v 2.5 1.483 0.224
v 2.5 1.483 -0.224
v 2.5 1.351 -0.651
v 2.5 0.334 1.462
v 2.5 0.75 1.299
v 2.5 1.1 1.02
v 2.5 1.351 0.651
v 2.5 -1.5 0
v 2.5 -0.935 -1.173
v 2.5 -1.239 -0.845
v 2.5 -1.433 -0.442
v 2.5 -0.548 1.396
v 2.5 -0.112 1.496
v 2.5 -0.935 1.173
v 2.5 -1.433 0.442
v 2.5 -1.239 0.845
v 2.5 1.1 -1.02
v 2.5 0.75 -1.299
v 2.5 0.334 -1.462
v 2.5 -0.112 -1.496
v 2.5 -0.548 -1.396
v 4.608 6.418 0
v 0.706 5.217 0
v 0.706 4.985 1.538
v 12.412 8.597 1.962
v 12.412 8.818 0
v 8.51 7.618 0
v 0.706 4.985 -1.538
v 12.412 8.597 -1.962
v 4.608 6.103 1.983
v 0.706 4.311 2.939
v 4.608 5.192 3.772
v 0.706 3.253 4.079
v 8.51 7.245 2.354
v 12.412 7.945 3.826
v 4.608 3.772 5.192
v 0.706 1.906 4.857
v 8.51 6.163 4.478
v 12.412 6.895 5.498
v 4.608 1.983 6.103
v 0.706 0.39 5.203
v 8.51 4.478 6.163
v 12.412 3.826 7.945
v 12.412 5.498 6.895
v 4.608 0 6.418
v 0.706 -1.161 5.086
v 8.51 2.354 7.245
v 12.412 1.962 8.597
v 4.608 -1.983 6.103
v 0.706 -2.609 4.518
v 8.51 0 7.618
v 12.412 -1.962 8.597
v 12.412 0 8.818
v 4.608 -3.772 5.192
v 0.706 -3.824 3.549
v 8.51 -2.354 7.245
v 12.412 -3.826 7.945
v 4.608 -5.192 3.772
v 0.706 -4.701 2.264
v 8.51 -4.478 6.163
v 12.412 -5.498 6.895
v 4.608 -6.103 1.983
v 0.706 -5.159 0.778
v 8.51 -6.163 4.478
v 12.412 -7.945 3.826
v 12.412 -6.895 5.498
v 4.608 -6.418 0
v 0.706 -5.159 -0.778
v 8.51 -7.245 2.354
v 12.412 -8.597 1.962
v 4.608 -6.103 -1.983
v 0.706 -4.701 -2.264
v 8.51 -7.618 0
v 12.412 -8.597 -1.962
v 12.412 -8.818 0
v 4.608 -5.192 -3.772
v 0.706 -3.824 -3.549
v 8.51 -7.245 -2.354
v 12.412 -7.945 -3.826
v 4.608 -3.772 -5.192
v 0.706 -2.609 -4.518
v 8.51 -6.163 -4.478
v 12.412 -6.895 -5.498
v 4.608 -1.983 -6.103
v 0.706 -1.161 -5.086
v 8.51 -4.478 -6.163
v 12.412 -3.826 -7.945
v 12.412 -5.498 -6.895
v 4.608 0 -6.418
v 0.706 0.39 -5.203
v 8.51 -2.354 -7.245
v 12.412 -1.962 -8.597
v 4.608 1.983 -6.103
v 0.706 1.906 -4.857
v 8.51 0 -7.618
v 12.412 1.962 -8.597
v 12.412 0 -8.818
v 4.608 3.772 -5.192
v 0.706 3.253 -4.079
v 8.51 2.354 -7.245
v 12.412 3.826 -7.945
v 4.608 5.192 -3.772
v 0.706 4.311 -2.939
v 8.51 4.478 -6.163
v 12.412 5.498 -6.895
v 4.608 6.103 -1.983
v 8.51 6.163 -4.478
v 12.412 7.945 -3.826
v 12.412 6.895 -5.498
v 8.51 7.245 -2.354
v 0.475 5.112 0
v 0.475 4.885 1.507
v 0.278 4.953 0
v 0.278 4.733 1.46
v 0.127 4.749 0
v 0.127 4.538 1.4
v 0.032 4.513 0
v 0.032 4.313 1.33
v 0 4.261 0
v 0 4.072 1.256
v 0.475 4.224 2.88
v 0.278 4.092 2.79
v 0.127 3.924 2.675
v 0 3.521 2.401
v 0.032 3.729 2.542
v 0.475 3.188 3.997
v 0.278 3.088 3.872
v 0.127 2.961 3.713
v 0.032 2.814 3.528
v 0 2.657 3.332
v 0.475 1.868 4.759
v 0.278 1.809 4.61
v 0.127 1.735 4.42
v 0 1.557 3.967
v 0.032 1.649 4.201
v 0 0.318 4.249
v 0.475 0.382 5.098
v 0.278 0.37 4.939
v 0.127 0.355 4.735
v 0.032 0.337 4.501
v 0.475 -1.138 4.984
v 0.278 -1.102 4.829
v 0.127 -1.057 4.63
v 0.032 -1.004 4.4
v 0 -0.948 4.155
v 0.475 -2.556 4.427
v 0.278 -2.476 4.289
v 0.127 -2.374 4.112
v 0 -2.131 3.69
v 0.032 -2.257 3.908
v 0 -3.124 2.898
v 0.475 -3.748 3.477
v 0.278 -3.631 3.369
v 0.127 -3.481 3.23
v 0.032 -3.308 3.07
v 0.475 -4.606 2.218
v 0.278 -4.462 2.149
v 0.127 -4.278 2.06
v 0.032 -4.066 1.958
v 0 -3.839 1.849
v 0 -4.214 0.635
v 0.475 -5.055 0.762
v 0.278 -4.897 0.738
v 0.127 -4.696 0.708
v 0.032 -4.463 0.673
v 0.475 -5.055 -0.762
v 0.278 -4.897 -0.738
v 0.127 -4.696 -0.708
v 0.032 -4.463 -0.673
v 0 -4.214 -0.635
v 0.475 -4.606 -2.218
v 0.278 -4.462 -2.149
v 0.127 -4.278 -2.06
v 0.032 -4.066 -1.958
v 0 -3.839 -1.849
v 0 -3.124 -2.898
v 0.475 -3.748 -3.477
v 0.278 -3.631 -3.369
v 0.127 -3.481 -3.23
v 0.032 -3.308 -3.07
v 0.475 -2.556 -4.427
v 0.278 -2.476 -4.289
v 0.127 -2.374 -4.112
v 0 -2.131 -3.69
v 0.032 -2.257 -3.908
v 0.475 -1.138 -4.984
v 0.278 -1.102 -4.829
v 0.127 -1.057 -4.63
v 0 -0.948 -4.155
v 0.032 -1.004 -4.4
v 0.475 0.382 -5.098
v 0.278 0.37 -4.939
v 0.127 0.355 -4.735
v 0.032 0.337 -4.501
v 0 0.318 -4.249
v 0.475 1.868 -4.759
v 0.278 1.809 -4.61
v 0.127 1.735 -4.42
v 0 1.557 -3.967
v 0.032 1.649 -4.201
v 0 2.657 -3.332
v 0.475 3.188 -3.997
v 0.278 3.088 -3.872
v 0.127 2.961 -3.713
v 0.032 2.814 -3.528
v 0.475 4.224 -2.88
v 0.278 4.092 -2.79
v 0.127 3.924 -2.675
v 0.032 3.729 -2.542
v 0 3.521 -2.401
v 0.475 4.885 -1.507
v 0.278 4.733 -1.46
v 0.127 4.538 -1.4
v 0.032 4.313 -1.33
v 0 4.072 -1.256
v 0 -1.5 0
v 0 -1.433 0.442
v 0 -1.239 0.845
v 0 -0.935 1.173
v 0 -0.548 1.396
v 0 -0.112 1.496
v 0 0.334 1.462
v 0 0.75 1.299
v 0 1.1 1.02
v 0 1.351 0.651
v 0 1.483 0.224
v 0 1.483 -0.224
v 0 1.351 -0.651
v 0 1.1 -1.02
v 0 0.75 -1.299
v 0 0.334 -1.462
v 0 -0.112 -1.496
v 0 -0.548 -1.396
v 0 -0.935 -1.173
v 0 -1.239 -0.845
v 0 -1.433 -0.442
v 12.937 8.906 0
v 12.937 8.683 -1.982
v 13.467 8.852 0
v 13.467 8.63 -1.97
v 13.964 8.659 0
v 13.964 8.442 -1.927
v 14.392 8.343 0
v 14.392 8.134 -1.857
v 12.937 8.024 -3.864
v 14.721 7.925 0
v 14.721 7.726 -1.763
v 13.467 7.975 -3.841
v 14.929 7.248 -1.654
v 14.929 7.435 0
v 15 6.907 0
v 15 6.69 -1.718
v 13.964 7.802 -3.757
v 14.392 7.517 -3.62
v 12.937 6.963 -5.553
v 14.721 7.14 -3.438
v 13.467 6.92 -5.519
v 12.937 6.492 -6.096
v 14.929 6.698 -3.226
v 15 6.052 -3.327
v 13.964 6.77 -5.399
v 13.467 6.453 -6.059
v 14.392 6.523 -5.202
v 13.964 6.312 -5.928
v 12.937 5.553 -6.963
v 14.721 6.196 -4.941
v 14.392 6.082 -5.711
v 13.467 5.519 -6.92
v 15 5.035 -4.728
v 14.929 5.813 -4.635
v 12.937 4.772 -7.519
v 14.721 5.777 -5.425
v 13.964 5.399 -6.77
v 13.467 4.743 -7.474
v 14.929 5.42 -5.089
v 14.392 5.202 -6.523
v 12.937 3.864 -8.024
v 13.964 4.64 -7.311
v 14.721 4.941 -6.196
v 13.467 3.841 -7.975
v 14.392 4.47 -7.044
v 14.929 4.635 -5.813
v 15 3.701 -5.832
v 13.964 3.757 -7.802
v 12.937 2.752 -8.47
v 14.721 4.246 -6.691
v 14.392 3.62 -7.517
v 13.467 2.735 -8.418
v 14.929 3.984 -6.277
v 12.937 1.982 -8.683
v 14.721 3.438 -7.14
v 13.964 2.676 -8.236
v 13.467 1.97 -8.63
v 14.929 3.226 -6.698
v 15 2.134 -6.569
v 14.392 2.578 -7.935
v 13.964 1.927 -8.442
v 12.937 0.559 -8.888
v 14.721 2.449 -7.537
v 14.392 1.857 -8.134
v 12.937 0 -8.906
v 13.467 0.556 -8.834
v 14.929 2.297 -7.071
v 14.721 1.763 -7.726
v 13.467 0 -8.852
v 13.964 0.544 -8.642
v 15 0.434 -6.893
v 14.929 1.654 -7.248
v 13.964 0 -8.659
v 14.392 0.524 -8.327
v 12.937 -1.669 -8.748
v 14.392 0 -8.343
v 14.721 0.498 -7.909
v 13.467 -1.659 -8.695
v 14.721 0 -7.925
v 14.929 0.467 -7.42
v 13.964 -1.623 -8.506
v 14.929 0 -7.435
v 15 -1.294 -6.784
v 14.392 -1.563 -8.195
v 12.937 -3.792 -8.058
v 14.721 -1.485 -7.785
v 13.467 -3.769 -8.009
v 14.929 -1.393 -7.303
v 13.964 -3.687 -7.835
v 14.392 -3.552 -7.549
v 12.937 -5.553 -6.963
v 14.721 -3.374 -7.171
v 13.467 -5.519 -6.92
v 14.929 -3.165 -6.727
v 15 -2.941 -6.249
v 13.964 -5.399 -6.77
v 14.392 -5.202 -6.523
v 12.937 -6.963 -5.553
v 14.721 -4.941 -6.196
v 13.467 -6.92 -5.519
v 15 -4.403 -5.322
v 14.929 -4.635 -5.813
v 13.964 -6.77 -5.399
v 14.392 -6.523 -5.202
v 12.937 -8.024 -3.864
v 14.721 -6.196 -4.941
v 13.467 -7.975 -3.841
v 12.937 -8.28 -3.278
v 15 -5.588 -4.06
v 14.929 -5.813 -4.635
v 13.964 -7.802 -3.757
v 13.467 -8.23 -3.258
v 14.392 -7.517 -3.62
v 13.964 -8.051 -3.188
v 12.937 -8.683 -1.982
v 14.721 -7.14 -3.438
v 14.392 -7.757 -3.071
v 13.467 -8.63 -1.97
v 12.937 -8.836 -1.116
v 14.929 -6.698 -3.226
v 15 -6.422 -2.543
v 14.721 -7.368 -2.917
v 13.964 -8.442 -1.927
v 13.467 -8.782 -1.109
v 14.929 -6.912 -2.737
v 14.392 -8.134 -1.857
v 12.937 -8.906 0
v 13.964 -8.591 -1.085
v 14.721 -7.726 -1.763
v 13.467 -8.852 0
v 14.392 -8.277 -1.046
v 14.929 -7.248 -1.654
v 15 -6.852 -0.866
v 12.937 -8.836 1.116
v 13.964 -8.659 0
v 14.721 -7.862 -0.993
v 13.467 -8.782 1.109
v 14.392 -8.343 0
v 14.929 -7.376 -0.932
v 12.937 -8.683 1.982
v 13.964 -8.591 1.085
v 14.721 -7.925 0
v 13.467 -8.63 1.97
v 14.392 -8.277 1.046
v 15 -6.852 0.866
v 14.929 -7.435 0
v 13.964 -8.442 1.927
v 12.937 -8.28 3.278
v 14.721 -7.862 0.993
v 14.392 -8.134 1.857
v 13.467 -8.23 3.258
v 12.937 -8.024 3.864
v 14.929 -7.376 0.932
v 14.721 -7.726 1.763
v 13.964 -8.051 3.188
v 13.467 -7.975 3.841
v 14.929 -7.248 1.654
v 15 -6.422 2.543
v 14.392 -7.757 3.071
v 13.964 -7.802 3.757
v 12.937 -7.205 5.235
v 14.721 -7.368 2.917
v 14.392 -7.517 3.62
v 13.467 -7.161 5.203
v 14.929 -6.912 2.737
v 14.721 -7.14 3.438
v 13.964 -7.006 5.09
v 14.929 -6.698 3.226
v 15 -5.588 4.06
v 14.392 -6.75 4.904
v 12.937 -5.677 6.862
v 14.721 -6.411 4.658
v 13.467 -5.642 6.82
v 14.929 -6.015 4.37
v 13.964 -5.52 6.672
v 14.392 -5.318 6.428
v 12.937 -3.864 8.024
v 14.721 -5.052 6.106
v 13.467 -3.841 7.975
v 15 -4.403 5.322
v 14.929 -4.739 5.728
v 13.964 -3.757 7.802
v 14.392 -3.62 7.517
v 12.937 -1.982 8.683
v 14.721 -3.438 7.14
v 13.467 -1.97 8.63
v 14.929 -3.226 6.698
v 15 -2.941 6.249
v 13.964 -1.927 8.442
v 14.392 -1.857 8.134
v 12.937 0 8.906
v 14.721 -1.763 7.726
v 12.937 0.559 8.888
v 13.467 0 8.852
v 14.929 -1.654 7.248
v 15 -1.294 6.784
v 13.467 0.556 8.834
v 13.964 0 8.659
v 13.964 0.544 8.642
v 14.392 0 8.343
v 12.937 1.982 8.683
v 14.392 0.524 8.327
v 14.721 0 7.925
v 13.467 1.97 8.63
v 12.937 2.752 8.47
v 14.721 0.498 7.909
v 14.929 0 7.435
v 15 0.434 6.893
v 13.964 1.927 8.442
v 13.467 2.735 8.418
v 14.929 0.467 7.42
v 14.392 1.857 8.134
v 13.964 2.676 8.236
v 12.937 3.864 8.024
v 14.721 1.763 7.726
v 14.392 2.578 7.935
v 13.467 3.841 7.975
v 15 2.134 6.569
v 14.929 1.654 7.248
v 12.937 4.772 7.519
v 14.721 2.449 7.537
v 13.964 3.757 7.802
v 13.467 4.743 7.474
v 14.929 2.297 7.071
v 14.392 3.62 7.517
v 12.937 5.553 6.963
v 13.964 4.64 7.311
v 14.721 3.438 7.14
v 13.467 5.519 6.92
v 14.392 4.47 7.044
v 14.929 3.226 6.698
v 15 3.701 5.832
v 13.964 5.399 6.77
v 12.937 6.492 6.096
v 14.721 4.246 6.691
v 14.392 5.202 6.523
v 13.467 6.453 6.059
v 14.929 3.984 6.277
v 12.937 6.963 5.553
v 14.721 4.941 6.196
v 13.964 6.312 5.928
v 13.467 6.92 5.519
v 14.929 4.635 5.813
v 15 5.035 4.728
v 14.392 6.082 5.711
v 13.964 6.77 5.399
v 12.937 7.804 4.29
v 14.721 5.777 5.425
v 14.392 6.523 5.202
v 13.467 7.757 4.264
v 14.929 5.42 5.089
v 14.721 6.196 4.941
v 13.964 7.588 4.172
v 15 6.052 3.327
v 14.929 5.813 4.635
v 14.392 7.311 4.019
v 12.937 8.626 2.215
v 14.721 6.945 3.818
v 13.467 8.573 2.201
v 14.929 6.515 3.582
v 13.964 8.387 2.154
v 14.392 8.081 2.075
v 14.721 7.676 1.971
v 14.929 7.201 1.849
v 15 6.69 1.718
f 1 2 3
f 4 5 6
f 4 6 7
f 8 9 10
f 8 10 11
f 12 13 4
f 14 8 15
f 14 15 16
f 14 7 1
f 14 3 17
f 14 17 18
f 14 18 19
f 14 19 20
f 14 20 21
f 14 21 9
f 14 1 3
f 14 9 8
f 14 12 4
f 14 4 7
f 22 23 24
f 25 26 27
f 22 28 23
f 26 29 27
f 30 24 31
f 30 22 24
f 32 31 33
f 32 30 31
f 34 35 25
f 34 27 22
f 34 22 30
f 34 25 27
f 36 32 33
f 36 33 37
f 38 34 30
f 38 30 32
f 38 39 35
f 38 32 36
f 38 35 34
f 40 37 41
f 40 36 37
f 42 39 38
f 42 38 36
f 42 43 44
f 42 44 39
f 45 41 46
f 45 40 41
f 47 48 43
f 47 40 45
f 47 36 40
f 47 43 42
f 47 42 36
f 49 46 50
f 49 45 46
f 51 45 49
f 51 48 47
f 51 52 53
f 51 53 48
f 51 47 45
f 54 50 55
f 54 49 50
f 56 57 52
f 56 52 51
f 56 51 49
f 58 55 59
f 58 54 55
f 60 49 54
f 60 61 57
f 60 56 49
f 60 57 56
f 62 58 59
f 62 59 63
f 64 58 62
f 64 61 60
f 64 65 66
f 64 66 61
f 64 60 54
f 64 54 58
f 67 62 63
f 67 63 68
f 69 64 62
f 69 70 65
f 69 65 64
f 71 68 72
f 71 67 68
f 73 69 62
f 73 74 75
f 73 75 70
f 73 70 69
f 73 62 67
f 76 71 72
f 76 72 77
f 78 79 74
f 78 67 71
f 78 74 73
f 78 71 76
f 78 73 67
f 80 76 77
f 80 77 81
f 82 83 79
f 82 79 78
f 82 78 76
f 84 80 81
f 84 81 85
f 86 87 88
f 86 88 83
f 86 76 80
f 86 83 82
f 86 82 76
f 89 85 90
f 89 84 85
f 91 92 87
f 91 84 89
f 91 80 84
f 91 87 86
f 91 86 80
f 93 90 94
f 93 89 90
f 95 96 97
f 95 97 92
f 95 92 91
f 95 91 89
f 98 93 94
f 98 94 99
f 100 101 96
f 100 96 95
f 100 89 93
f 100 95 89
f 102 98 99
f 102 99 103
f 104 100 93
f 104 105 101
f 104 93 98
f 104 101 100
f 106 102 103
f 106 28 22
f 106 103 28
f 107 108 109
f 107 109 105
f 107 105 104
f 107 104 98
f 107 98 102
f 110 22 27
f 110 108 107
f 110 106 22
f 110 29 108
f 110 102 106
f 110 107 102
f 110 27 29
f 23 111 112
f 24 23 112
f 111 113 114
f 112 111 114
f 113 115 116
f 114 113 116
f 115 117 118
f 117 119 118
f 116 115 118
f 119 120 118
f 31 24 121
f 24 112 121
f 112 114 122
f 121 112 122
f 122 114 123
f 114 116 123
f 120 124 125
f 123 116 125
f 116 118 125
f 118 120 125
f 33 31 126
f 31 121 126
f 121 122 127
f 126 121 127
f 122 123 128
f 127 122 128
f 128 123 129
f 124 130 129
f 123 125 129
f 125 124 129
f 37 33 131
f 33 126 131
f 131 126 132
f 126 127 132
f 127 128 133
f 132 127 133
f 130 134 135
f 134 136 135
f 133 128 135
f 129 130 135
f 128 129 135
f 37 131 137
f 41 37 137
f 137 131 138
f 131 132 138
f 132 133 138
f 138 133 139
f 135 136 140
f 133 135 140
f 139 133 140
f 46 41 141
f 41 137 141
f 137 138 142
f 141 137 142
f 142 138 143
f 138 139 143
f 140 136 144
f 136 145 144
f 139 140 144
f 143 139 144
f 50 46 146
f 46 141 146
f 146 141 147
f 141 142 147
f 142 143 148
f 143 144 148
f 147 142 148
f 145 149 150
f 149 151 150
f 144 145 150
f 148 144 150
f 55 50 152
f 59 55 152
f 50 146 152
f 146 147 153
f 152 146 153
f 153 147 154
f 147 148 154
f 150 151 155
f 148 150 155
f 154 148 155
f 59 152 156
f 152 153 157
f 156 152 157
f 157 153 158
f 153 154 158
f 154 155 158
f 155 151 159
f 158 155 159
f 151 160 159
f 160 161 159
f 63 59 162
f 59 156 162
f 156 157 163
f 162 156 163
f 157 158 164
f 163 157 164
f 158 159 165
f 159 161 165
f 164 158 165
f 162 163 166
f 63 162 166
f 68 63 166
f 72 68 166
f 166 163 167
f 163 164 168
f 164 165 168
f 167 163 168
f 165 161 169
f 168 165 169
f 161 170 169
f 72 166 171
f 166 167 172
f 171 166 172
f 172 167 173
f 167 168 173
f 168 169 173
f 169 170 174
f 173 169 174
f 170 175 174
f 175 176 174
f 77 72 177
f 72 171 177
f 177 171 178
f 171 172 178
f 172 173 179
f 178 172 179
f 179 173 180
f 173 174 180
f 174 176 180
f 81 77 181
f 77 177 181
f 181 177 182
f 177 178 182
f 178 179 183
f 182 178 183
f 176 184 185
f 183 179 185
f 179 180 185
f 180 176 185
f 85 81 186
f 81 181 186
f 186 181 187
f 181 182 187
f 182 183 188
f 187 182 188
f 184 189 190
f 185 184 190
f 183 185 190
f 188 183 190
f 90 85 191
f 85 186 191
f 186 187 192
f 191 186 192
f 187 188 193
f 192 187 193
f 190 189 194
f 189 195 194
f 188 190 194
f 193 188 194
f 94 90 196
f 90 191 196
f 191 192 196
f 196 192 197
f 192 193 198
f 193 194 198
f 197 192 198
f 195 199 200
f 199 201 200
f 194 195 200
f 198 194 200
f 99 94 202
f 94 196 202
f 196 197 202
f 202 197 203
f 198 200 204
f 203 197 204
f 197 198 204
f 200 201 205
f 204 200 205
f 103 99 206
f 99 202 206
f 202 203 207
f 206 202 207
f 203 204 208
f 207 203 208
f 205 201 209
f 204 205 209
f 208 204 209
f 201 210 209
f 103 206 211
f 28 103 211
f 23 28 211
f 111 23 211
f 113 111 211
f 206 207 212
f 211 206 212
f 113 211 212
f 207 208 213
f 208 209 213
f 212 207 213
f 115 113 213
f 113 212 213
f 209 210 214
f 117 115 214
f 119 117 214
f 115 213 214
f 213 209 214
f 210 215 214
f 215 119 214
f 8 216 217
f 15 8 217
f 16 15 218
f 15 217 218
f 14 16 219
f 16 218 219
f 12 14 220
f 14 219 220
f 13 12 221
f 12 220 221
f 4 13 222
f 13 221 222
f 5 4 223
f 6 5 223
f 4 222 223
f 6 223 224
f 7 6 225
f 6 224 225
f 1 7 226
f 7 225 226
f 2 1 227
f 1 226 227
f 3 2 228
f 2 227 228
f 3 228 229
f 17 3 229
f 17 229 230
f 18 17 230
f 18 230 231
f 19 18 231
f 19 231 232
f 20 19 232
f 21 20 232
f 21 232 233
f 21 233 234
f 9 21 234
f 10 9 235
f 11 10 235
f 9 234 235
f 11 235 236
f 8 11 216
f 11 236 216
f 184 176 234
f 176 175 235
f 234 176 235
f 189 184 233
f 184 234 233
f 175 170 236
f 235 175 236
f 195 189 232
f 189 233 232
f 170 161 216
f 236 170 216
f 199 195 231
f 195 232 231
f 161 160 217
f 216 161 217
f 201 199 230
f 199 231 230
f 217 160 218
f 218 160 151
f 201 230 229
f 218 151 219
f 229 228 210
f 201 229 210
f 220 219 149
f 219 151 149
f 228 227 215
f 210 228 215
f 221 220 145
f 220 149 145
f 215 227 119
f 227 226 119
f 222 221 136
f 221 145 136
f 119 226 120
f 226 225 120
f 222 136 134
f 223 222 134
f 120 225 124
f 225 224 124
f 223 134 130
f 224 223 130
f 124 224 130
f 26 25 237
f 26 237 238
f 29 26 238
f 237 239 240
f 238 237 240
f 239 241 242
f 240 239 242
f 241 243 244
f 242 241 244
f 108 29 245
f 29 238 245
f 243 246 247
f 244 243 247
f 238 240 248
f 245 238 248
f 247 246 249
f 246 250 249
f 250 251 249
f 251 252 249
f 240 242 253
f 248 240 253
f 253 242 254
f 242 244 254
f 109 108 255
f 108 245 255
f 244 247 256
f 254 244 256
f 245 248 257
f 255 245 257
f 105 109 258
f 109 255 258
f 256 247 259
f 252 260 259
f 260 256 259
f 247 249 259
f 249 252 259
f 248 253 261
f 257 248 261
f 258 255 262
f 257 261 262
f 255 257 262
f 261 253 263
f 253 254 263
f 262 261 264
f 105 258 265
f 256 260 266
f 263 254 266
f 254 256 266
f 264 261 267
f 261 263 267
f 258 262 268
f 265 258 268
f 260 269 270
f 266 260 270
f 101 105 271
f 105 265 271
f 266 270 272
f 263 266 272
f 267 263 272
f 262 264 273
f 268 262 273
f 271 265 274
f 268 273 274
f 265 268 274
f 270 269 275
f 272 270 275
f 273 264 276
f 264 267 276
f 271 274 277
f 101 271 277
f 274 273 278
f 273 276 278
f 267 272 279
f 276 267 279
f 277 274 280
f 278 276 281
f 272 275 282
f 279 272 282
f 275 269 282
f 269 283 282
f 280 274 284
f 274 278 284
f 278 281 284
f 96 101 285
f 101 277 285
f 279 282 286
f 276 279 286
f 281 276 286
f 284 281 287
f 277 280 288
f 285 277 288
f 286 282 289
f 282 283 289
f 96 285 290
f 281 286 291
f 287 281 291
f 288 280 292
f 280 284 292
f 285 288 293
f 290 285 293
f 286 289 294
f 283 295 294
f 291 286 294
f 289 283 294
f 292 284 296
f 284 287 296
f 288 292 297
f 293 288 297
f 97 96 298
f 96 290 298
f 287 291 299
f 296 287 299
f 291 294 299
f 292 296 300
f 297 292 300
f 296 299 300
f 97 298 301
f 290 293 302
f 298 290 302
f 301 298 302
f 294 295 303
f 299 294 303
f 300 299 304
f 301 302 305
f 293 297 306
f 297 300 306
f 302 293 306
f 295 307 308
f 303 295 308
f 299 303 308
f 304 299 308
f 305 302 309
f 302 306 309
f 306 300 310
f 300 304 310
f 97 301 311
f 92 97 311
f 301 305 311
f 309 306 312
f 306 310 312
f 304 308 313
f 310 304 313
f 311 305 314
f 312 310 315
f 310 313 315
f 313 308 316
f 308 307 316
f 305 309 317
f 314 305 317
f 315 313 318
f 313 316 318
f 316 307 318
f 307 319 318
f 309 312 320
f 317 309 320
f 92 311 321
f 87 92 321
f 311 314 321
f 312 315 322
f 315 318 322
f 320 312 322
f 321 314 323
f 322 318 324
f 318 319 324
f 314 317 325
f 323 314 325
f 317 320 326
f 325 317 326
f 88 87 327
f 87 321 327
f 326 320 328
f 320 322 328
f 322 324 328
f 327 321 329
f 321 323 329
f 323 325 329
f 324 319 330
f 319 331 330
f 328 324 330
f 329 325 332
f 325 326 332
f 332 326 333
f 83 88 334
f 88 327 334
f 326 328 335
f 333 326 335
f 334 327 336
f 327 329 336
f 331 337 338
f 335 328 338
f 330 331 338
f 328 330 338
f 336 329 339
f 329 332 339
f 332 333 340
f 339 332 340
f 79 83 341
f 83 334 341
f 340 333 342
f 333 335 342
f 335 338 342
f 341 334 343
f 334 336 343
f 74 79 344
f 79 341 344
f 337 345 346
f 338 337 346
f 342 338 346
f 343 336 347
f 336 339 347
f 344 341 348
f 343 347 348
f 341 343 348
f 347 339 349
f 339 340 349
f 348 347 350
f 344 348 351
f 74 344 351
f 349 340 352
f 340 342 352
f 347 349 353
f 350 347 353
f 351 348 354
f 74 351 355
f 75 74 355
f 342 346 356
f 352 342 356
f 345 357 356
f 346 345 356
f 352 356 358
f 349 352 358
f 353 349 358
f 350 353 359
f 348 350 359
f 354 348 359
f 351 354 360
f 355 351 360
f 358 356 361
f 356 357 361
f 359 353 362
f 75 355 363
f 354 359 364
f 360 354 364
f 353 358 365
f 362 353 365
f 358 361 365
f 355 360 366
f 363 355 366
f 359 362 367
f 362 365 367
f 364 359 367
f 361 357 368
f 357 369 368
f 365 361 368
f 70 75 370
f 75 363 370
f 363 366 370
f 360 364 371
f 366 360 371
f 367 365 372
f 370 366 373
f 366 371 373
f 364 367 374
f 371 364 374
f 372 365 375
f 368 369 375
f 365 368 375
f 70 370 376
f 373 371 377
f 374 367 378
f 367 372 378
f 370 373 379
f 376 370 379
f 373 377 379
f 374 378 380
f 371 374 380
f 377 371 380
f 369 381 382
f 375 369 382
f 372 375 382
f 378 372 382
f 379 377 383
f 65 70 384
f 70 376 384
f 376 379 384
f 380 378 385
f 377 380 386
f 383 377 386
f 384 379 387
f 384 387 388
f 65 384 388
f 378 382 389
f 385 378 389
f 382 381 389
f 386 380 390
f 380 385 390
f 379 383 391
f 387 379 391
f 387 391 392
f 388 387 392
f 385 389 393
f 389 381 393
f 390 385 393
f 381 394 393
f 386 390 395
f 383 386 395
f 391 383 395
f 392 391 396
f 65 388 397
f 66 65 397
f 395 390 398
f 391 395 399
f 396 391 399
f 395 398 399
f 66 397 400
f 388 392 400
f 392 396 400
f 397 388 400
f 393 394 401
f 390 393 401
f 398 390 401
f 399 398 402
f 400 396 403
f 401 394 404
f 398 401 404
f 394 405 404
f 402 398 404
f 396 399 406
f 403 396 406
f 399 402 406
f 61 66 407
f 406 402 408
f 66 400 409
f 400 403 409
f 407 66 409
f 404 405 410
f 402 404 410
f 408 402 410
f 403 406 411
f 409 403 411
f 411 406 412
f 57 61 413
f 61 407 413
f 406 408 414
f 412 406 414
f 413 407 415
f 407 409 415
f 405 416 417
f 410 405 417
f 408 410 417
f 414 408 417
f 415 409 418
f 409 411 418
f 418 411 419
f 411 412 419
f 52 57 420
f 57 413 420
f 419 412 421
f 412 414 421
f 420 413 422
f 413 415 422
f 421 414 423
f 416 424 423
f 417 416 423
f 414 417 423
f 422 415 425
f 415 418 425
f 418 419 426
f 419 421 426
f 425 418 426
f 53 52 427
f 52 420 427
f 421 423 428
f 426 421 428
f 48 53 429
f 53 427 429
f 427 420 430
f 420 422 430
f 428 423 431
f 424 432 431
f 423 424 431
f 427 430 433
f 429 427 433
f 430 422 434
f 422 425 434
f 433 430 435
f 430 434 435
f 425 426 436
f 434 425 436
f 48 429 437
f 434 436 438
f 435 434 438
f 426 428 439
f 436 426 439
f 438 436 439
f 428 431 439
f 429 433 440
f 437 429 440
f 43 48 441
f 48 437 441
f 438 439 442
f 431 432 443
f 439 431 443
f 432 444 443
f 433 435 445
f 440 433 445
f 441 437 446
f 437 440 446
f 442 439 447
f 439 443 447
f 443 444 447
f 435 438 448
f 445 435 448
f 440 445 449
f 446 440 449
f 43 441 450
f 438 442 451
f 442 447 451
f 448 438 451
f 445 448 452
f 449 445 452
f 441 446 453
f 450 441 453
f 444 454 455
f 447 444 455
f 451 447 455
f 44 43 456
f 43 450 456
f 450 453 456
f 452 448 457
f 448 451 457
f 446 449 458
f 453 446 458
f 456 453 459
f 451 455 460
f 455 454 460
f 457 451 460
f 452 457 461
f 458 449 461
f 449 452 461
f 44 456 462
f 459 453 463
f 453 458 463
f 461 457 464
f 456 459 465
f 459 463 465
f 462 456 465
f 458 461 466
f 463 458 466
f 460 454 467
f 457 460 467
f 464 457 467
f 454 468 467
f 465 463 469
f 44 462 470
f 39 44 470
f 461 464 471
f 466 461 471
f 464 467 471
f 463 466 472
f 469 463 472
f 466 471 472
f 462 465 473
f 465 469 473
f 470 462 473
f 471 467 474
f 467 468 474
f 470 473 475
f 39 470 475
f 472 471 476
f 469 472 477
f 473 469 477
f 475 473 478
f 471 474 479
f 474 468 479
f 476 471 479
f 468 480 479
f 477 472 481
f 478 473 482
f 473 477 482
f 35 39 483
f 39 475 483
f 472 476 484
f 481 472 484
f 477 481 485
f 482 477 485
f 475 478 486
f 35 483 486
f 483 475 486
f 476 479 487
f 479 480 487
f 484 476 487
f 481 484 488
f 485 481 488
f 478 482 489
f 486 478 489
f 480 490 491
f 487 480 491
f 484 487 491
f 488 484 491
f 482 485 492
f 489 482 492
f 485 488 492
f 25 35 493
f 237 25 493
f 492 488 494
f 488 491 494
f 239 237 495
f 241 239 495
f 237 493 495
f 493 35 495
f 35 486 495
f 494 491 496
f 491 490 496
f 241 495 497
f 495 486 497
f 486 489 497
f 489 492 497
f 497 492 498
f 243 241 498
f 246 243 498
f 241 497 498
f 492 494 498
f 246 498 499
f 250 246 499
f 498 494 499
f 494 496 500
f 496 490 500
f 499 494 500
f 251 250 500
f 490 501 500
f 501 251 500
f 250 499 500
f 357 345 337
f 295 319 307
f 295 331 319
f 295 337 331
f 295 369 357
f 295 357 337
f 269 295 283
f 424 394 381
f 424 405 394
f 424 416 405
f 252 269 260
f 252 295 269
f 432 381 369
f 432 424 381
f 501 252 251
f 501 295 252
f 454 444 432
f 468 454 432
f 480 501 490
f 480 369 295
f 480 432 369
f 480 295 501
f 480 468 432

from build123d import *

# Parameters (mm, degrees)
F0_R     = 5
F1_DEPTH = 15
F1_TAPER = -17.1
F2_R     = 2
F3_R     = 1
F4_R     = 1.5
F5_DEPTH = 2.5


with BuildPart() as f1:
    # F0 (on Right) → F1 (new body)
    with BuildSketch(Plane.YZ):
        Circle(F0_R)
    extrude(amount=F1_DEPTH, taper=F1_TAPER)

    # F2
    f2_edges = [f1.edges().sort_by_distance(p)[0] for p in [
        (15, -9.614603, 0),
    ]]
    fillet(f2_edges, radius=F2_R)

    # F3
    f3_edges = [f1.edges().sort_by_distance(p)[0] for p in [
        (0, -5, 0),
    ]]
    fillet(f3_edges, radius=F3_R)

    # F4 (on face) → F5 (cut)
    with BuildSketch(Plane(origin=(0, 0, 0), x_dir=(0, -1, 0), z_dir=(-1, 0, 0))):
        Circle(F4_R)
    extrude(amount=-F5_DEPTH, mode=Mode.SUBTRACT)


solid = f1.part
